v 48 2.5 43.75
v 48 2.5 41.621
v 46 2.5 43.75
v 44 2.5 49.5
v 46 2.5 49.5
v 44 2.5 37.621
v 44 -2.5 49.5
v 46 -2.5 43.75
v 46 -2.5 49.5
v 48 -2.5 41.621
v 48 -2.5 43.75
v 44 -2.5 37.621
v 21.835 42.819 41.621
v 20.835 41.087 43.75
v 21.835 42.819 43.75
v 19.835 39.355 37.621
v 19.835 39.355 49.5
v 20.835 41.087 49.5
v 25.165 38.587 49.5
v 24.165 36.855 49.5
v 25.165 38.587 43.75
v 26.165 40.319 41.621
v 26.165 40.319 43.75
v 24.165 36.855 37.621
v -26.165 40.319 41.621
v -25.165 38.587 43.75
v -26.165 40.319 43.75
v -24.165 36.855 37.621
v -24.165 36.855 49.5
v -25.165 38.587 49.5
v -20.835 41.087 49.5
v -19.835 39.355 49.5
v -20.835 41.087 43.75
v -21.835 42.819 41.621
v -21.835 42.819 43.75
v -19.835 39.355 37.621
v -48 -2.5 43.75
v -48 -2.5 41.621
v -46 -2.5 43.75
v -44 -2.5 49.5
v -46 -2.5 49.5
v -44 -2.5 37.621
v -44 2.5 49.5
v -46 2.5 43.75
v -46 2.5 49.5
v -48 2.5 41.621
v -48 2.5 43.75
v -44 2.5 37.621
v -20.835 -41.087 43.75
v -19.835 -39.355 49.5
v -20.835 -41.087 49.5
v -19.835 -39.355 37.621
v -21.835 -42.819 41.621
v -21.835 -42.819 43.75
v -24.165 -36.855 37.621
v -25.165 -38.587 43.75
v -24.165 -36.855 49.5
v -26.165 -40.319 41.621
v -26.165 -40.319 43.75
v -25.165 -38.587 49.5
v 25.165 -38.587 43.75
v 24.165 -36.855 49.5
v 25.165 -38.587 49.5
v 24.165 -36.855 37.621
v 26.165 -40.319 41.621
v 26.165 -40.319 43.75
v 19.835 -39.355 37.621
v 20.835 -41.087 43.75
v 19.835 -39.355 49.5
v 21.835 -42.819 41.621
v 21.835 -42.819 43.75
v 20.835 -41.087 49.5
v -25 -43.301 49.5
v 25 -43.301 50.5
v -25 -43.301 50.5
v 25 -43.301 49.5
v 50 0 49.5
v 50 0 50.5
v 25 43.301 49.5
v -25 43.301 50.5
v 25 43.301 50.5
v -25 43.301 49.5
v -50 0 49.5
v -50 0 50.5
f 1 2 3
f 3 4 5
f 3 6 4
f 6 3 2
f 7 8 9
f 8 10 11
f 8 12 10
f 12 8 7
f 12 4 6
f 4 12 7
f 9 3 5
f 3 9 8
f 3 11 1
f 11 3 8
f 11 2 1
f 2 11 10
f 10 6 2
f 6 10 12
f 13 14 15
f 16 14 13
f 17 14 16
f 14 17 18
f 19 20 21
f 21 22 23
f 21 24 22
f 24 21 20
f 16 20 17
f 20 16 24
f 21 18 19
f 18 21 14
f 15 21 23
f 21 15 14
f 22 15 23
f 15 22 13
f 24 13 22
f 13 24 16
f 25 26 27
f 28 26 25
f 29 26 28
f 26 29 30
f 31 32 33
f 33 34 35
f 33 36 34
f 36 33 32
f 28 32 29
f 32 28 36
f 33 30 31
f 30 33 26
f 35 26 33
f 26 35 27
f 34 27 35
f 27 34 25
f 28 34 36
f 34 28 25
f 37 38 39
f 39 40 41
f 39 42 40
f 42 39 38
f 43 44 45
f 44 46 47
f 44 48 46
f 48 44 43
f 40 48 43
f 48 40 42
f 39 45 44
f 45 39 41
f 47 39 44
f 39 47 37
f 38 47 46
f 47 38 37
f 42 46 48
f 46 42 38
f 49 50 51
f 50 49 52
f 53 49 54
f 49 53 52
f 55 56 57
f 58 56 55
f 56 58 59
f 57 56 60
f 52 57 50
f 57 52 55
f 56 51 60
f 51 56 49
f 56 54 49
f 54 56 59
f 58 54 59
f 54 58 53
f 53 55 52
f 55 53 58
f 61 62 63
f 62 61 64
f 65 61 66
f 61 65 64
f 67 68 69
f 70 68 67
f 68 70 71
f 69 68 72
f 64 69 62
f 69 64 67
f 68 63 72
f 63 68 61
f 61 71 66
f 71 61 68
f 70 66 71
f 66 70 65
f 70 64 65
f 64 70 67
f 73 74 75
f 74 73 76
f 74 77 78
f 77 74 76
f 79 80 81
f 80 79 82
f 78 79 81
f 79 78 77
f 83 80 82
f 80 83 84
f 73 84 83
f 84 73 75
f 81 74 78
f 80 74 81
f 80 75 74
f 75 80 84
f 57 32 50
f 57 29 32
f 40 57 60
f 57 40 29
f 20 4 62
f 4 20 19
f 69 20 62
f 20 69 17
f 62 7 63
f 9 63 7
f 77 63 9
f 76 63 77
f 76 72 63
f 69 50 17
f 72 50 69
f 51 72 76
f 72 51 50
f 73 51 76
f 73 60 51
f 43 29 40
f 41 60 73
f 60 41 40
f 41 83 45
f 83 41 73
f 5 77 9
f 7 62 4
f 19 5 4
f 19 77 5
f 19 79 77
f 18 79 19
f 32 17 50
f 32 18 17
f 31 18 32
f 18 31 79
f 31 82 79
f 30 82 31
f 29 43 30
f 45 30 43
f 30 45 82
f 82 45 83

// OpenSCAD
width = 50;
height = width / 2;
wall_thickness = 2;
face_thickness = 1;
screw_radius = 2;

module box() {
	difference() {
		cylinder(r=width, h=height, $fn=6, center=true);
		translate([0, 0, face_thickness])
			cylinder(r=width - wall_thickness, h=height, $fn=6, center=true);
	}
	
	translate([0, 0, height / 4])
		difference() {
			cylinder(r=width, h=wall_thickness, $fn=6, center=true);
			cylinder(r=width - (2 * wall_thickness), h=wall_thickness, $fn=6, center=true);
		}
}

module holes(shift=0) {
	for (i=[0:5]) {
		rotate([90, 0, 360 / 6 * i])
			translate([shift, 0, 0])
				cylinder(r=screw_radius, h=width, $fn=50);

		rotate([90, 0, 360 / 6 * i])
			translate([-screw_radius + shift, 0, 0])
				cube([screw_radius * 2, height, width]);
	}
}

module notch() {	
	difference() {
		union() {
			cube([5, wall_thickness, height / 2]);
			translate([0, -wall_thickness, 0])
				cube([5, wall_thickness, height / 4]);
		}
		rotate([45, 0, 0])
			translate([0, -2.5, -1.5])
				cube([5, wall_thickness * 2, height / 3]);
	}
}

module lid() {
	cylinder(r=width, h=face_thickness, $fn=6, center=true);
	// Hooks
	for (i=[0:5]) {
		rotate([0, 0, 360 / 6 * (i + 0)])
			translate([width - (wall_thickness * 2), -2.5, -(height / 2)])
				rotate([0, 0, 90])
					notch();
					
	}
}

difference() {
	//box();
	//holes();
	//holes(width / 4);
}

translate([0, 0, 50])
	lid();
